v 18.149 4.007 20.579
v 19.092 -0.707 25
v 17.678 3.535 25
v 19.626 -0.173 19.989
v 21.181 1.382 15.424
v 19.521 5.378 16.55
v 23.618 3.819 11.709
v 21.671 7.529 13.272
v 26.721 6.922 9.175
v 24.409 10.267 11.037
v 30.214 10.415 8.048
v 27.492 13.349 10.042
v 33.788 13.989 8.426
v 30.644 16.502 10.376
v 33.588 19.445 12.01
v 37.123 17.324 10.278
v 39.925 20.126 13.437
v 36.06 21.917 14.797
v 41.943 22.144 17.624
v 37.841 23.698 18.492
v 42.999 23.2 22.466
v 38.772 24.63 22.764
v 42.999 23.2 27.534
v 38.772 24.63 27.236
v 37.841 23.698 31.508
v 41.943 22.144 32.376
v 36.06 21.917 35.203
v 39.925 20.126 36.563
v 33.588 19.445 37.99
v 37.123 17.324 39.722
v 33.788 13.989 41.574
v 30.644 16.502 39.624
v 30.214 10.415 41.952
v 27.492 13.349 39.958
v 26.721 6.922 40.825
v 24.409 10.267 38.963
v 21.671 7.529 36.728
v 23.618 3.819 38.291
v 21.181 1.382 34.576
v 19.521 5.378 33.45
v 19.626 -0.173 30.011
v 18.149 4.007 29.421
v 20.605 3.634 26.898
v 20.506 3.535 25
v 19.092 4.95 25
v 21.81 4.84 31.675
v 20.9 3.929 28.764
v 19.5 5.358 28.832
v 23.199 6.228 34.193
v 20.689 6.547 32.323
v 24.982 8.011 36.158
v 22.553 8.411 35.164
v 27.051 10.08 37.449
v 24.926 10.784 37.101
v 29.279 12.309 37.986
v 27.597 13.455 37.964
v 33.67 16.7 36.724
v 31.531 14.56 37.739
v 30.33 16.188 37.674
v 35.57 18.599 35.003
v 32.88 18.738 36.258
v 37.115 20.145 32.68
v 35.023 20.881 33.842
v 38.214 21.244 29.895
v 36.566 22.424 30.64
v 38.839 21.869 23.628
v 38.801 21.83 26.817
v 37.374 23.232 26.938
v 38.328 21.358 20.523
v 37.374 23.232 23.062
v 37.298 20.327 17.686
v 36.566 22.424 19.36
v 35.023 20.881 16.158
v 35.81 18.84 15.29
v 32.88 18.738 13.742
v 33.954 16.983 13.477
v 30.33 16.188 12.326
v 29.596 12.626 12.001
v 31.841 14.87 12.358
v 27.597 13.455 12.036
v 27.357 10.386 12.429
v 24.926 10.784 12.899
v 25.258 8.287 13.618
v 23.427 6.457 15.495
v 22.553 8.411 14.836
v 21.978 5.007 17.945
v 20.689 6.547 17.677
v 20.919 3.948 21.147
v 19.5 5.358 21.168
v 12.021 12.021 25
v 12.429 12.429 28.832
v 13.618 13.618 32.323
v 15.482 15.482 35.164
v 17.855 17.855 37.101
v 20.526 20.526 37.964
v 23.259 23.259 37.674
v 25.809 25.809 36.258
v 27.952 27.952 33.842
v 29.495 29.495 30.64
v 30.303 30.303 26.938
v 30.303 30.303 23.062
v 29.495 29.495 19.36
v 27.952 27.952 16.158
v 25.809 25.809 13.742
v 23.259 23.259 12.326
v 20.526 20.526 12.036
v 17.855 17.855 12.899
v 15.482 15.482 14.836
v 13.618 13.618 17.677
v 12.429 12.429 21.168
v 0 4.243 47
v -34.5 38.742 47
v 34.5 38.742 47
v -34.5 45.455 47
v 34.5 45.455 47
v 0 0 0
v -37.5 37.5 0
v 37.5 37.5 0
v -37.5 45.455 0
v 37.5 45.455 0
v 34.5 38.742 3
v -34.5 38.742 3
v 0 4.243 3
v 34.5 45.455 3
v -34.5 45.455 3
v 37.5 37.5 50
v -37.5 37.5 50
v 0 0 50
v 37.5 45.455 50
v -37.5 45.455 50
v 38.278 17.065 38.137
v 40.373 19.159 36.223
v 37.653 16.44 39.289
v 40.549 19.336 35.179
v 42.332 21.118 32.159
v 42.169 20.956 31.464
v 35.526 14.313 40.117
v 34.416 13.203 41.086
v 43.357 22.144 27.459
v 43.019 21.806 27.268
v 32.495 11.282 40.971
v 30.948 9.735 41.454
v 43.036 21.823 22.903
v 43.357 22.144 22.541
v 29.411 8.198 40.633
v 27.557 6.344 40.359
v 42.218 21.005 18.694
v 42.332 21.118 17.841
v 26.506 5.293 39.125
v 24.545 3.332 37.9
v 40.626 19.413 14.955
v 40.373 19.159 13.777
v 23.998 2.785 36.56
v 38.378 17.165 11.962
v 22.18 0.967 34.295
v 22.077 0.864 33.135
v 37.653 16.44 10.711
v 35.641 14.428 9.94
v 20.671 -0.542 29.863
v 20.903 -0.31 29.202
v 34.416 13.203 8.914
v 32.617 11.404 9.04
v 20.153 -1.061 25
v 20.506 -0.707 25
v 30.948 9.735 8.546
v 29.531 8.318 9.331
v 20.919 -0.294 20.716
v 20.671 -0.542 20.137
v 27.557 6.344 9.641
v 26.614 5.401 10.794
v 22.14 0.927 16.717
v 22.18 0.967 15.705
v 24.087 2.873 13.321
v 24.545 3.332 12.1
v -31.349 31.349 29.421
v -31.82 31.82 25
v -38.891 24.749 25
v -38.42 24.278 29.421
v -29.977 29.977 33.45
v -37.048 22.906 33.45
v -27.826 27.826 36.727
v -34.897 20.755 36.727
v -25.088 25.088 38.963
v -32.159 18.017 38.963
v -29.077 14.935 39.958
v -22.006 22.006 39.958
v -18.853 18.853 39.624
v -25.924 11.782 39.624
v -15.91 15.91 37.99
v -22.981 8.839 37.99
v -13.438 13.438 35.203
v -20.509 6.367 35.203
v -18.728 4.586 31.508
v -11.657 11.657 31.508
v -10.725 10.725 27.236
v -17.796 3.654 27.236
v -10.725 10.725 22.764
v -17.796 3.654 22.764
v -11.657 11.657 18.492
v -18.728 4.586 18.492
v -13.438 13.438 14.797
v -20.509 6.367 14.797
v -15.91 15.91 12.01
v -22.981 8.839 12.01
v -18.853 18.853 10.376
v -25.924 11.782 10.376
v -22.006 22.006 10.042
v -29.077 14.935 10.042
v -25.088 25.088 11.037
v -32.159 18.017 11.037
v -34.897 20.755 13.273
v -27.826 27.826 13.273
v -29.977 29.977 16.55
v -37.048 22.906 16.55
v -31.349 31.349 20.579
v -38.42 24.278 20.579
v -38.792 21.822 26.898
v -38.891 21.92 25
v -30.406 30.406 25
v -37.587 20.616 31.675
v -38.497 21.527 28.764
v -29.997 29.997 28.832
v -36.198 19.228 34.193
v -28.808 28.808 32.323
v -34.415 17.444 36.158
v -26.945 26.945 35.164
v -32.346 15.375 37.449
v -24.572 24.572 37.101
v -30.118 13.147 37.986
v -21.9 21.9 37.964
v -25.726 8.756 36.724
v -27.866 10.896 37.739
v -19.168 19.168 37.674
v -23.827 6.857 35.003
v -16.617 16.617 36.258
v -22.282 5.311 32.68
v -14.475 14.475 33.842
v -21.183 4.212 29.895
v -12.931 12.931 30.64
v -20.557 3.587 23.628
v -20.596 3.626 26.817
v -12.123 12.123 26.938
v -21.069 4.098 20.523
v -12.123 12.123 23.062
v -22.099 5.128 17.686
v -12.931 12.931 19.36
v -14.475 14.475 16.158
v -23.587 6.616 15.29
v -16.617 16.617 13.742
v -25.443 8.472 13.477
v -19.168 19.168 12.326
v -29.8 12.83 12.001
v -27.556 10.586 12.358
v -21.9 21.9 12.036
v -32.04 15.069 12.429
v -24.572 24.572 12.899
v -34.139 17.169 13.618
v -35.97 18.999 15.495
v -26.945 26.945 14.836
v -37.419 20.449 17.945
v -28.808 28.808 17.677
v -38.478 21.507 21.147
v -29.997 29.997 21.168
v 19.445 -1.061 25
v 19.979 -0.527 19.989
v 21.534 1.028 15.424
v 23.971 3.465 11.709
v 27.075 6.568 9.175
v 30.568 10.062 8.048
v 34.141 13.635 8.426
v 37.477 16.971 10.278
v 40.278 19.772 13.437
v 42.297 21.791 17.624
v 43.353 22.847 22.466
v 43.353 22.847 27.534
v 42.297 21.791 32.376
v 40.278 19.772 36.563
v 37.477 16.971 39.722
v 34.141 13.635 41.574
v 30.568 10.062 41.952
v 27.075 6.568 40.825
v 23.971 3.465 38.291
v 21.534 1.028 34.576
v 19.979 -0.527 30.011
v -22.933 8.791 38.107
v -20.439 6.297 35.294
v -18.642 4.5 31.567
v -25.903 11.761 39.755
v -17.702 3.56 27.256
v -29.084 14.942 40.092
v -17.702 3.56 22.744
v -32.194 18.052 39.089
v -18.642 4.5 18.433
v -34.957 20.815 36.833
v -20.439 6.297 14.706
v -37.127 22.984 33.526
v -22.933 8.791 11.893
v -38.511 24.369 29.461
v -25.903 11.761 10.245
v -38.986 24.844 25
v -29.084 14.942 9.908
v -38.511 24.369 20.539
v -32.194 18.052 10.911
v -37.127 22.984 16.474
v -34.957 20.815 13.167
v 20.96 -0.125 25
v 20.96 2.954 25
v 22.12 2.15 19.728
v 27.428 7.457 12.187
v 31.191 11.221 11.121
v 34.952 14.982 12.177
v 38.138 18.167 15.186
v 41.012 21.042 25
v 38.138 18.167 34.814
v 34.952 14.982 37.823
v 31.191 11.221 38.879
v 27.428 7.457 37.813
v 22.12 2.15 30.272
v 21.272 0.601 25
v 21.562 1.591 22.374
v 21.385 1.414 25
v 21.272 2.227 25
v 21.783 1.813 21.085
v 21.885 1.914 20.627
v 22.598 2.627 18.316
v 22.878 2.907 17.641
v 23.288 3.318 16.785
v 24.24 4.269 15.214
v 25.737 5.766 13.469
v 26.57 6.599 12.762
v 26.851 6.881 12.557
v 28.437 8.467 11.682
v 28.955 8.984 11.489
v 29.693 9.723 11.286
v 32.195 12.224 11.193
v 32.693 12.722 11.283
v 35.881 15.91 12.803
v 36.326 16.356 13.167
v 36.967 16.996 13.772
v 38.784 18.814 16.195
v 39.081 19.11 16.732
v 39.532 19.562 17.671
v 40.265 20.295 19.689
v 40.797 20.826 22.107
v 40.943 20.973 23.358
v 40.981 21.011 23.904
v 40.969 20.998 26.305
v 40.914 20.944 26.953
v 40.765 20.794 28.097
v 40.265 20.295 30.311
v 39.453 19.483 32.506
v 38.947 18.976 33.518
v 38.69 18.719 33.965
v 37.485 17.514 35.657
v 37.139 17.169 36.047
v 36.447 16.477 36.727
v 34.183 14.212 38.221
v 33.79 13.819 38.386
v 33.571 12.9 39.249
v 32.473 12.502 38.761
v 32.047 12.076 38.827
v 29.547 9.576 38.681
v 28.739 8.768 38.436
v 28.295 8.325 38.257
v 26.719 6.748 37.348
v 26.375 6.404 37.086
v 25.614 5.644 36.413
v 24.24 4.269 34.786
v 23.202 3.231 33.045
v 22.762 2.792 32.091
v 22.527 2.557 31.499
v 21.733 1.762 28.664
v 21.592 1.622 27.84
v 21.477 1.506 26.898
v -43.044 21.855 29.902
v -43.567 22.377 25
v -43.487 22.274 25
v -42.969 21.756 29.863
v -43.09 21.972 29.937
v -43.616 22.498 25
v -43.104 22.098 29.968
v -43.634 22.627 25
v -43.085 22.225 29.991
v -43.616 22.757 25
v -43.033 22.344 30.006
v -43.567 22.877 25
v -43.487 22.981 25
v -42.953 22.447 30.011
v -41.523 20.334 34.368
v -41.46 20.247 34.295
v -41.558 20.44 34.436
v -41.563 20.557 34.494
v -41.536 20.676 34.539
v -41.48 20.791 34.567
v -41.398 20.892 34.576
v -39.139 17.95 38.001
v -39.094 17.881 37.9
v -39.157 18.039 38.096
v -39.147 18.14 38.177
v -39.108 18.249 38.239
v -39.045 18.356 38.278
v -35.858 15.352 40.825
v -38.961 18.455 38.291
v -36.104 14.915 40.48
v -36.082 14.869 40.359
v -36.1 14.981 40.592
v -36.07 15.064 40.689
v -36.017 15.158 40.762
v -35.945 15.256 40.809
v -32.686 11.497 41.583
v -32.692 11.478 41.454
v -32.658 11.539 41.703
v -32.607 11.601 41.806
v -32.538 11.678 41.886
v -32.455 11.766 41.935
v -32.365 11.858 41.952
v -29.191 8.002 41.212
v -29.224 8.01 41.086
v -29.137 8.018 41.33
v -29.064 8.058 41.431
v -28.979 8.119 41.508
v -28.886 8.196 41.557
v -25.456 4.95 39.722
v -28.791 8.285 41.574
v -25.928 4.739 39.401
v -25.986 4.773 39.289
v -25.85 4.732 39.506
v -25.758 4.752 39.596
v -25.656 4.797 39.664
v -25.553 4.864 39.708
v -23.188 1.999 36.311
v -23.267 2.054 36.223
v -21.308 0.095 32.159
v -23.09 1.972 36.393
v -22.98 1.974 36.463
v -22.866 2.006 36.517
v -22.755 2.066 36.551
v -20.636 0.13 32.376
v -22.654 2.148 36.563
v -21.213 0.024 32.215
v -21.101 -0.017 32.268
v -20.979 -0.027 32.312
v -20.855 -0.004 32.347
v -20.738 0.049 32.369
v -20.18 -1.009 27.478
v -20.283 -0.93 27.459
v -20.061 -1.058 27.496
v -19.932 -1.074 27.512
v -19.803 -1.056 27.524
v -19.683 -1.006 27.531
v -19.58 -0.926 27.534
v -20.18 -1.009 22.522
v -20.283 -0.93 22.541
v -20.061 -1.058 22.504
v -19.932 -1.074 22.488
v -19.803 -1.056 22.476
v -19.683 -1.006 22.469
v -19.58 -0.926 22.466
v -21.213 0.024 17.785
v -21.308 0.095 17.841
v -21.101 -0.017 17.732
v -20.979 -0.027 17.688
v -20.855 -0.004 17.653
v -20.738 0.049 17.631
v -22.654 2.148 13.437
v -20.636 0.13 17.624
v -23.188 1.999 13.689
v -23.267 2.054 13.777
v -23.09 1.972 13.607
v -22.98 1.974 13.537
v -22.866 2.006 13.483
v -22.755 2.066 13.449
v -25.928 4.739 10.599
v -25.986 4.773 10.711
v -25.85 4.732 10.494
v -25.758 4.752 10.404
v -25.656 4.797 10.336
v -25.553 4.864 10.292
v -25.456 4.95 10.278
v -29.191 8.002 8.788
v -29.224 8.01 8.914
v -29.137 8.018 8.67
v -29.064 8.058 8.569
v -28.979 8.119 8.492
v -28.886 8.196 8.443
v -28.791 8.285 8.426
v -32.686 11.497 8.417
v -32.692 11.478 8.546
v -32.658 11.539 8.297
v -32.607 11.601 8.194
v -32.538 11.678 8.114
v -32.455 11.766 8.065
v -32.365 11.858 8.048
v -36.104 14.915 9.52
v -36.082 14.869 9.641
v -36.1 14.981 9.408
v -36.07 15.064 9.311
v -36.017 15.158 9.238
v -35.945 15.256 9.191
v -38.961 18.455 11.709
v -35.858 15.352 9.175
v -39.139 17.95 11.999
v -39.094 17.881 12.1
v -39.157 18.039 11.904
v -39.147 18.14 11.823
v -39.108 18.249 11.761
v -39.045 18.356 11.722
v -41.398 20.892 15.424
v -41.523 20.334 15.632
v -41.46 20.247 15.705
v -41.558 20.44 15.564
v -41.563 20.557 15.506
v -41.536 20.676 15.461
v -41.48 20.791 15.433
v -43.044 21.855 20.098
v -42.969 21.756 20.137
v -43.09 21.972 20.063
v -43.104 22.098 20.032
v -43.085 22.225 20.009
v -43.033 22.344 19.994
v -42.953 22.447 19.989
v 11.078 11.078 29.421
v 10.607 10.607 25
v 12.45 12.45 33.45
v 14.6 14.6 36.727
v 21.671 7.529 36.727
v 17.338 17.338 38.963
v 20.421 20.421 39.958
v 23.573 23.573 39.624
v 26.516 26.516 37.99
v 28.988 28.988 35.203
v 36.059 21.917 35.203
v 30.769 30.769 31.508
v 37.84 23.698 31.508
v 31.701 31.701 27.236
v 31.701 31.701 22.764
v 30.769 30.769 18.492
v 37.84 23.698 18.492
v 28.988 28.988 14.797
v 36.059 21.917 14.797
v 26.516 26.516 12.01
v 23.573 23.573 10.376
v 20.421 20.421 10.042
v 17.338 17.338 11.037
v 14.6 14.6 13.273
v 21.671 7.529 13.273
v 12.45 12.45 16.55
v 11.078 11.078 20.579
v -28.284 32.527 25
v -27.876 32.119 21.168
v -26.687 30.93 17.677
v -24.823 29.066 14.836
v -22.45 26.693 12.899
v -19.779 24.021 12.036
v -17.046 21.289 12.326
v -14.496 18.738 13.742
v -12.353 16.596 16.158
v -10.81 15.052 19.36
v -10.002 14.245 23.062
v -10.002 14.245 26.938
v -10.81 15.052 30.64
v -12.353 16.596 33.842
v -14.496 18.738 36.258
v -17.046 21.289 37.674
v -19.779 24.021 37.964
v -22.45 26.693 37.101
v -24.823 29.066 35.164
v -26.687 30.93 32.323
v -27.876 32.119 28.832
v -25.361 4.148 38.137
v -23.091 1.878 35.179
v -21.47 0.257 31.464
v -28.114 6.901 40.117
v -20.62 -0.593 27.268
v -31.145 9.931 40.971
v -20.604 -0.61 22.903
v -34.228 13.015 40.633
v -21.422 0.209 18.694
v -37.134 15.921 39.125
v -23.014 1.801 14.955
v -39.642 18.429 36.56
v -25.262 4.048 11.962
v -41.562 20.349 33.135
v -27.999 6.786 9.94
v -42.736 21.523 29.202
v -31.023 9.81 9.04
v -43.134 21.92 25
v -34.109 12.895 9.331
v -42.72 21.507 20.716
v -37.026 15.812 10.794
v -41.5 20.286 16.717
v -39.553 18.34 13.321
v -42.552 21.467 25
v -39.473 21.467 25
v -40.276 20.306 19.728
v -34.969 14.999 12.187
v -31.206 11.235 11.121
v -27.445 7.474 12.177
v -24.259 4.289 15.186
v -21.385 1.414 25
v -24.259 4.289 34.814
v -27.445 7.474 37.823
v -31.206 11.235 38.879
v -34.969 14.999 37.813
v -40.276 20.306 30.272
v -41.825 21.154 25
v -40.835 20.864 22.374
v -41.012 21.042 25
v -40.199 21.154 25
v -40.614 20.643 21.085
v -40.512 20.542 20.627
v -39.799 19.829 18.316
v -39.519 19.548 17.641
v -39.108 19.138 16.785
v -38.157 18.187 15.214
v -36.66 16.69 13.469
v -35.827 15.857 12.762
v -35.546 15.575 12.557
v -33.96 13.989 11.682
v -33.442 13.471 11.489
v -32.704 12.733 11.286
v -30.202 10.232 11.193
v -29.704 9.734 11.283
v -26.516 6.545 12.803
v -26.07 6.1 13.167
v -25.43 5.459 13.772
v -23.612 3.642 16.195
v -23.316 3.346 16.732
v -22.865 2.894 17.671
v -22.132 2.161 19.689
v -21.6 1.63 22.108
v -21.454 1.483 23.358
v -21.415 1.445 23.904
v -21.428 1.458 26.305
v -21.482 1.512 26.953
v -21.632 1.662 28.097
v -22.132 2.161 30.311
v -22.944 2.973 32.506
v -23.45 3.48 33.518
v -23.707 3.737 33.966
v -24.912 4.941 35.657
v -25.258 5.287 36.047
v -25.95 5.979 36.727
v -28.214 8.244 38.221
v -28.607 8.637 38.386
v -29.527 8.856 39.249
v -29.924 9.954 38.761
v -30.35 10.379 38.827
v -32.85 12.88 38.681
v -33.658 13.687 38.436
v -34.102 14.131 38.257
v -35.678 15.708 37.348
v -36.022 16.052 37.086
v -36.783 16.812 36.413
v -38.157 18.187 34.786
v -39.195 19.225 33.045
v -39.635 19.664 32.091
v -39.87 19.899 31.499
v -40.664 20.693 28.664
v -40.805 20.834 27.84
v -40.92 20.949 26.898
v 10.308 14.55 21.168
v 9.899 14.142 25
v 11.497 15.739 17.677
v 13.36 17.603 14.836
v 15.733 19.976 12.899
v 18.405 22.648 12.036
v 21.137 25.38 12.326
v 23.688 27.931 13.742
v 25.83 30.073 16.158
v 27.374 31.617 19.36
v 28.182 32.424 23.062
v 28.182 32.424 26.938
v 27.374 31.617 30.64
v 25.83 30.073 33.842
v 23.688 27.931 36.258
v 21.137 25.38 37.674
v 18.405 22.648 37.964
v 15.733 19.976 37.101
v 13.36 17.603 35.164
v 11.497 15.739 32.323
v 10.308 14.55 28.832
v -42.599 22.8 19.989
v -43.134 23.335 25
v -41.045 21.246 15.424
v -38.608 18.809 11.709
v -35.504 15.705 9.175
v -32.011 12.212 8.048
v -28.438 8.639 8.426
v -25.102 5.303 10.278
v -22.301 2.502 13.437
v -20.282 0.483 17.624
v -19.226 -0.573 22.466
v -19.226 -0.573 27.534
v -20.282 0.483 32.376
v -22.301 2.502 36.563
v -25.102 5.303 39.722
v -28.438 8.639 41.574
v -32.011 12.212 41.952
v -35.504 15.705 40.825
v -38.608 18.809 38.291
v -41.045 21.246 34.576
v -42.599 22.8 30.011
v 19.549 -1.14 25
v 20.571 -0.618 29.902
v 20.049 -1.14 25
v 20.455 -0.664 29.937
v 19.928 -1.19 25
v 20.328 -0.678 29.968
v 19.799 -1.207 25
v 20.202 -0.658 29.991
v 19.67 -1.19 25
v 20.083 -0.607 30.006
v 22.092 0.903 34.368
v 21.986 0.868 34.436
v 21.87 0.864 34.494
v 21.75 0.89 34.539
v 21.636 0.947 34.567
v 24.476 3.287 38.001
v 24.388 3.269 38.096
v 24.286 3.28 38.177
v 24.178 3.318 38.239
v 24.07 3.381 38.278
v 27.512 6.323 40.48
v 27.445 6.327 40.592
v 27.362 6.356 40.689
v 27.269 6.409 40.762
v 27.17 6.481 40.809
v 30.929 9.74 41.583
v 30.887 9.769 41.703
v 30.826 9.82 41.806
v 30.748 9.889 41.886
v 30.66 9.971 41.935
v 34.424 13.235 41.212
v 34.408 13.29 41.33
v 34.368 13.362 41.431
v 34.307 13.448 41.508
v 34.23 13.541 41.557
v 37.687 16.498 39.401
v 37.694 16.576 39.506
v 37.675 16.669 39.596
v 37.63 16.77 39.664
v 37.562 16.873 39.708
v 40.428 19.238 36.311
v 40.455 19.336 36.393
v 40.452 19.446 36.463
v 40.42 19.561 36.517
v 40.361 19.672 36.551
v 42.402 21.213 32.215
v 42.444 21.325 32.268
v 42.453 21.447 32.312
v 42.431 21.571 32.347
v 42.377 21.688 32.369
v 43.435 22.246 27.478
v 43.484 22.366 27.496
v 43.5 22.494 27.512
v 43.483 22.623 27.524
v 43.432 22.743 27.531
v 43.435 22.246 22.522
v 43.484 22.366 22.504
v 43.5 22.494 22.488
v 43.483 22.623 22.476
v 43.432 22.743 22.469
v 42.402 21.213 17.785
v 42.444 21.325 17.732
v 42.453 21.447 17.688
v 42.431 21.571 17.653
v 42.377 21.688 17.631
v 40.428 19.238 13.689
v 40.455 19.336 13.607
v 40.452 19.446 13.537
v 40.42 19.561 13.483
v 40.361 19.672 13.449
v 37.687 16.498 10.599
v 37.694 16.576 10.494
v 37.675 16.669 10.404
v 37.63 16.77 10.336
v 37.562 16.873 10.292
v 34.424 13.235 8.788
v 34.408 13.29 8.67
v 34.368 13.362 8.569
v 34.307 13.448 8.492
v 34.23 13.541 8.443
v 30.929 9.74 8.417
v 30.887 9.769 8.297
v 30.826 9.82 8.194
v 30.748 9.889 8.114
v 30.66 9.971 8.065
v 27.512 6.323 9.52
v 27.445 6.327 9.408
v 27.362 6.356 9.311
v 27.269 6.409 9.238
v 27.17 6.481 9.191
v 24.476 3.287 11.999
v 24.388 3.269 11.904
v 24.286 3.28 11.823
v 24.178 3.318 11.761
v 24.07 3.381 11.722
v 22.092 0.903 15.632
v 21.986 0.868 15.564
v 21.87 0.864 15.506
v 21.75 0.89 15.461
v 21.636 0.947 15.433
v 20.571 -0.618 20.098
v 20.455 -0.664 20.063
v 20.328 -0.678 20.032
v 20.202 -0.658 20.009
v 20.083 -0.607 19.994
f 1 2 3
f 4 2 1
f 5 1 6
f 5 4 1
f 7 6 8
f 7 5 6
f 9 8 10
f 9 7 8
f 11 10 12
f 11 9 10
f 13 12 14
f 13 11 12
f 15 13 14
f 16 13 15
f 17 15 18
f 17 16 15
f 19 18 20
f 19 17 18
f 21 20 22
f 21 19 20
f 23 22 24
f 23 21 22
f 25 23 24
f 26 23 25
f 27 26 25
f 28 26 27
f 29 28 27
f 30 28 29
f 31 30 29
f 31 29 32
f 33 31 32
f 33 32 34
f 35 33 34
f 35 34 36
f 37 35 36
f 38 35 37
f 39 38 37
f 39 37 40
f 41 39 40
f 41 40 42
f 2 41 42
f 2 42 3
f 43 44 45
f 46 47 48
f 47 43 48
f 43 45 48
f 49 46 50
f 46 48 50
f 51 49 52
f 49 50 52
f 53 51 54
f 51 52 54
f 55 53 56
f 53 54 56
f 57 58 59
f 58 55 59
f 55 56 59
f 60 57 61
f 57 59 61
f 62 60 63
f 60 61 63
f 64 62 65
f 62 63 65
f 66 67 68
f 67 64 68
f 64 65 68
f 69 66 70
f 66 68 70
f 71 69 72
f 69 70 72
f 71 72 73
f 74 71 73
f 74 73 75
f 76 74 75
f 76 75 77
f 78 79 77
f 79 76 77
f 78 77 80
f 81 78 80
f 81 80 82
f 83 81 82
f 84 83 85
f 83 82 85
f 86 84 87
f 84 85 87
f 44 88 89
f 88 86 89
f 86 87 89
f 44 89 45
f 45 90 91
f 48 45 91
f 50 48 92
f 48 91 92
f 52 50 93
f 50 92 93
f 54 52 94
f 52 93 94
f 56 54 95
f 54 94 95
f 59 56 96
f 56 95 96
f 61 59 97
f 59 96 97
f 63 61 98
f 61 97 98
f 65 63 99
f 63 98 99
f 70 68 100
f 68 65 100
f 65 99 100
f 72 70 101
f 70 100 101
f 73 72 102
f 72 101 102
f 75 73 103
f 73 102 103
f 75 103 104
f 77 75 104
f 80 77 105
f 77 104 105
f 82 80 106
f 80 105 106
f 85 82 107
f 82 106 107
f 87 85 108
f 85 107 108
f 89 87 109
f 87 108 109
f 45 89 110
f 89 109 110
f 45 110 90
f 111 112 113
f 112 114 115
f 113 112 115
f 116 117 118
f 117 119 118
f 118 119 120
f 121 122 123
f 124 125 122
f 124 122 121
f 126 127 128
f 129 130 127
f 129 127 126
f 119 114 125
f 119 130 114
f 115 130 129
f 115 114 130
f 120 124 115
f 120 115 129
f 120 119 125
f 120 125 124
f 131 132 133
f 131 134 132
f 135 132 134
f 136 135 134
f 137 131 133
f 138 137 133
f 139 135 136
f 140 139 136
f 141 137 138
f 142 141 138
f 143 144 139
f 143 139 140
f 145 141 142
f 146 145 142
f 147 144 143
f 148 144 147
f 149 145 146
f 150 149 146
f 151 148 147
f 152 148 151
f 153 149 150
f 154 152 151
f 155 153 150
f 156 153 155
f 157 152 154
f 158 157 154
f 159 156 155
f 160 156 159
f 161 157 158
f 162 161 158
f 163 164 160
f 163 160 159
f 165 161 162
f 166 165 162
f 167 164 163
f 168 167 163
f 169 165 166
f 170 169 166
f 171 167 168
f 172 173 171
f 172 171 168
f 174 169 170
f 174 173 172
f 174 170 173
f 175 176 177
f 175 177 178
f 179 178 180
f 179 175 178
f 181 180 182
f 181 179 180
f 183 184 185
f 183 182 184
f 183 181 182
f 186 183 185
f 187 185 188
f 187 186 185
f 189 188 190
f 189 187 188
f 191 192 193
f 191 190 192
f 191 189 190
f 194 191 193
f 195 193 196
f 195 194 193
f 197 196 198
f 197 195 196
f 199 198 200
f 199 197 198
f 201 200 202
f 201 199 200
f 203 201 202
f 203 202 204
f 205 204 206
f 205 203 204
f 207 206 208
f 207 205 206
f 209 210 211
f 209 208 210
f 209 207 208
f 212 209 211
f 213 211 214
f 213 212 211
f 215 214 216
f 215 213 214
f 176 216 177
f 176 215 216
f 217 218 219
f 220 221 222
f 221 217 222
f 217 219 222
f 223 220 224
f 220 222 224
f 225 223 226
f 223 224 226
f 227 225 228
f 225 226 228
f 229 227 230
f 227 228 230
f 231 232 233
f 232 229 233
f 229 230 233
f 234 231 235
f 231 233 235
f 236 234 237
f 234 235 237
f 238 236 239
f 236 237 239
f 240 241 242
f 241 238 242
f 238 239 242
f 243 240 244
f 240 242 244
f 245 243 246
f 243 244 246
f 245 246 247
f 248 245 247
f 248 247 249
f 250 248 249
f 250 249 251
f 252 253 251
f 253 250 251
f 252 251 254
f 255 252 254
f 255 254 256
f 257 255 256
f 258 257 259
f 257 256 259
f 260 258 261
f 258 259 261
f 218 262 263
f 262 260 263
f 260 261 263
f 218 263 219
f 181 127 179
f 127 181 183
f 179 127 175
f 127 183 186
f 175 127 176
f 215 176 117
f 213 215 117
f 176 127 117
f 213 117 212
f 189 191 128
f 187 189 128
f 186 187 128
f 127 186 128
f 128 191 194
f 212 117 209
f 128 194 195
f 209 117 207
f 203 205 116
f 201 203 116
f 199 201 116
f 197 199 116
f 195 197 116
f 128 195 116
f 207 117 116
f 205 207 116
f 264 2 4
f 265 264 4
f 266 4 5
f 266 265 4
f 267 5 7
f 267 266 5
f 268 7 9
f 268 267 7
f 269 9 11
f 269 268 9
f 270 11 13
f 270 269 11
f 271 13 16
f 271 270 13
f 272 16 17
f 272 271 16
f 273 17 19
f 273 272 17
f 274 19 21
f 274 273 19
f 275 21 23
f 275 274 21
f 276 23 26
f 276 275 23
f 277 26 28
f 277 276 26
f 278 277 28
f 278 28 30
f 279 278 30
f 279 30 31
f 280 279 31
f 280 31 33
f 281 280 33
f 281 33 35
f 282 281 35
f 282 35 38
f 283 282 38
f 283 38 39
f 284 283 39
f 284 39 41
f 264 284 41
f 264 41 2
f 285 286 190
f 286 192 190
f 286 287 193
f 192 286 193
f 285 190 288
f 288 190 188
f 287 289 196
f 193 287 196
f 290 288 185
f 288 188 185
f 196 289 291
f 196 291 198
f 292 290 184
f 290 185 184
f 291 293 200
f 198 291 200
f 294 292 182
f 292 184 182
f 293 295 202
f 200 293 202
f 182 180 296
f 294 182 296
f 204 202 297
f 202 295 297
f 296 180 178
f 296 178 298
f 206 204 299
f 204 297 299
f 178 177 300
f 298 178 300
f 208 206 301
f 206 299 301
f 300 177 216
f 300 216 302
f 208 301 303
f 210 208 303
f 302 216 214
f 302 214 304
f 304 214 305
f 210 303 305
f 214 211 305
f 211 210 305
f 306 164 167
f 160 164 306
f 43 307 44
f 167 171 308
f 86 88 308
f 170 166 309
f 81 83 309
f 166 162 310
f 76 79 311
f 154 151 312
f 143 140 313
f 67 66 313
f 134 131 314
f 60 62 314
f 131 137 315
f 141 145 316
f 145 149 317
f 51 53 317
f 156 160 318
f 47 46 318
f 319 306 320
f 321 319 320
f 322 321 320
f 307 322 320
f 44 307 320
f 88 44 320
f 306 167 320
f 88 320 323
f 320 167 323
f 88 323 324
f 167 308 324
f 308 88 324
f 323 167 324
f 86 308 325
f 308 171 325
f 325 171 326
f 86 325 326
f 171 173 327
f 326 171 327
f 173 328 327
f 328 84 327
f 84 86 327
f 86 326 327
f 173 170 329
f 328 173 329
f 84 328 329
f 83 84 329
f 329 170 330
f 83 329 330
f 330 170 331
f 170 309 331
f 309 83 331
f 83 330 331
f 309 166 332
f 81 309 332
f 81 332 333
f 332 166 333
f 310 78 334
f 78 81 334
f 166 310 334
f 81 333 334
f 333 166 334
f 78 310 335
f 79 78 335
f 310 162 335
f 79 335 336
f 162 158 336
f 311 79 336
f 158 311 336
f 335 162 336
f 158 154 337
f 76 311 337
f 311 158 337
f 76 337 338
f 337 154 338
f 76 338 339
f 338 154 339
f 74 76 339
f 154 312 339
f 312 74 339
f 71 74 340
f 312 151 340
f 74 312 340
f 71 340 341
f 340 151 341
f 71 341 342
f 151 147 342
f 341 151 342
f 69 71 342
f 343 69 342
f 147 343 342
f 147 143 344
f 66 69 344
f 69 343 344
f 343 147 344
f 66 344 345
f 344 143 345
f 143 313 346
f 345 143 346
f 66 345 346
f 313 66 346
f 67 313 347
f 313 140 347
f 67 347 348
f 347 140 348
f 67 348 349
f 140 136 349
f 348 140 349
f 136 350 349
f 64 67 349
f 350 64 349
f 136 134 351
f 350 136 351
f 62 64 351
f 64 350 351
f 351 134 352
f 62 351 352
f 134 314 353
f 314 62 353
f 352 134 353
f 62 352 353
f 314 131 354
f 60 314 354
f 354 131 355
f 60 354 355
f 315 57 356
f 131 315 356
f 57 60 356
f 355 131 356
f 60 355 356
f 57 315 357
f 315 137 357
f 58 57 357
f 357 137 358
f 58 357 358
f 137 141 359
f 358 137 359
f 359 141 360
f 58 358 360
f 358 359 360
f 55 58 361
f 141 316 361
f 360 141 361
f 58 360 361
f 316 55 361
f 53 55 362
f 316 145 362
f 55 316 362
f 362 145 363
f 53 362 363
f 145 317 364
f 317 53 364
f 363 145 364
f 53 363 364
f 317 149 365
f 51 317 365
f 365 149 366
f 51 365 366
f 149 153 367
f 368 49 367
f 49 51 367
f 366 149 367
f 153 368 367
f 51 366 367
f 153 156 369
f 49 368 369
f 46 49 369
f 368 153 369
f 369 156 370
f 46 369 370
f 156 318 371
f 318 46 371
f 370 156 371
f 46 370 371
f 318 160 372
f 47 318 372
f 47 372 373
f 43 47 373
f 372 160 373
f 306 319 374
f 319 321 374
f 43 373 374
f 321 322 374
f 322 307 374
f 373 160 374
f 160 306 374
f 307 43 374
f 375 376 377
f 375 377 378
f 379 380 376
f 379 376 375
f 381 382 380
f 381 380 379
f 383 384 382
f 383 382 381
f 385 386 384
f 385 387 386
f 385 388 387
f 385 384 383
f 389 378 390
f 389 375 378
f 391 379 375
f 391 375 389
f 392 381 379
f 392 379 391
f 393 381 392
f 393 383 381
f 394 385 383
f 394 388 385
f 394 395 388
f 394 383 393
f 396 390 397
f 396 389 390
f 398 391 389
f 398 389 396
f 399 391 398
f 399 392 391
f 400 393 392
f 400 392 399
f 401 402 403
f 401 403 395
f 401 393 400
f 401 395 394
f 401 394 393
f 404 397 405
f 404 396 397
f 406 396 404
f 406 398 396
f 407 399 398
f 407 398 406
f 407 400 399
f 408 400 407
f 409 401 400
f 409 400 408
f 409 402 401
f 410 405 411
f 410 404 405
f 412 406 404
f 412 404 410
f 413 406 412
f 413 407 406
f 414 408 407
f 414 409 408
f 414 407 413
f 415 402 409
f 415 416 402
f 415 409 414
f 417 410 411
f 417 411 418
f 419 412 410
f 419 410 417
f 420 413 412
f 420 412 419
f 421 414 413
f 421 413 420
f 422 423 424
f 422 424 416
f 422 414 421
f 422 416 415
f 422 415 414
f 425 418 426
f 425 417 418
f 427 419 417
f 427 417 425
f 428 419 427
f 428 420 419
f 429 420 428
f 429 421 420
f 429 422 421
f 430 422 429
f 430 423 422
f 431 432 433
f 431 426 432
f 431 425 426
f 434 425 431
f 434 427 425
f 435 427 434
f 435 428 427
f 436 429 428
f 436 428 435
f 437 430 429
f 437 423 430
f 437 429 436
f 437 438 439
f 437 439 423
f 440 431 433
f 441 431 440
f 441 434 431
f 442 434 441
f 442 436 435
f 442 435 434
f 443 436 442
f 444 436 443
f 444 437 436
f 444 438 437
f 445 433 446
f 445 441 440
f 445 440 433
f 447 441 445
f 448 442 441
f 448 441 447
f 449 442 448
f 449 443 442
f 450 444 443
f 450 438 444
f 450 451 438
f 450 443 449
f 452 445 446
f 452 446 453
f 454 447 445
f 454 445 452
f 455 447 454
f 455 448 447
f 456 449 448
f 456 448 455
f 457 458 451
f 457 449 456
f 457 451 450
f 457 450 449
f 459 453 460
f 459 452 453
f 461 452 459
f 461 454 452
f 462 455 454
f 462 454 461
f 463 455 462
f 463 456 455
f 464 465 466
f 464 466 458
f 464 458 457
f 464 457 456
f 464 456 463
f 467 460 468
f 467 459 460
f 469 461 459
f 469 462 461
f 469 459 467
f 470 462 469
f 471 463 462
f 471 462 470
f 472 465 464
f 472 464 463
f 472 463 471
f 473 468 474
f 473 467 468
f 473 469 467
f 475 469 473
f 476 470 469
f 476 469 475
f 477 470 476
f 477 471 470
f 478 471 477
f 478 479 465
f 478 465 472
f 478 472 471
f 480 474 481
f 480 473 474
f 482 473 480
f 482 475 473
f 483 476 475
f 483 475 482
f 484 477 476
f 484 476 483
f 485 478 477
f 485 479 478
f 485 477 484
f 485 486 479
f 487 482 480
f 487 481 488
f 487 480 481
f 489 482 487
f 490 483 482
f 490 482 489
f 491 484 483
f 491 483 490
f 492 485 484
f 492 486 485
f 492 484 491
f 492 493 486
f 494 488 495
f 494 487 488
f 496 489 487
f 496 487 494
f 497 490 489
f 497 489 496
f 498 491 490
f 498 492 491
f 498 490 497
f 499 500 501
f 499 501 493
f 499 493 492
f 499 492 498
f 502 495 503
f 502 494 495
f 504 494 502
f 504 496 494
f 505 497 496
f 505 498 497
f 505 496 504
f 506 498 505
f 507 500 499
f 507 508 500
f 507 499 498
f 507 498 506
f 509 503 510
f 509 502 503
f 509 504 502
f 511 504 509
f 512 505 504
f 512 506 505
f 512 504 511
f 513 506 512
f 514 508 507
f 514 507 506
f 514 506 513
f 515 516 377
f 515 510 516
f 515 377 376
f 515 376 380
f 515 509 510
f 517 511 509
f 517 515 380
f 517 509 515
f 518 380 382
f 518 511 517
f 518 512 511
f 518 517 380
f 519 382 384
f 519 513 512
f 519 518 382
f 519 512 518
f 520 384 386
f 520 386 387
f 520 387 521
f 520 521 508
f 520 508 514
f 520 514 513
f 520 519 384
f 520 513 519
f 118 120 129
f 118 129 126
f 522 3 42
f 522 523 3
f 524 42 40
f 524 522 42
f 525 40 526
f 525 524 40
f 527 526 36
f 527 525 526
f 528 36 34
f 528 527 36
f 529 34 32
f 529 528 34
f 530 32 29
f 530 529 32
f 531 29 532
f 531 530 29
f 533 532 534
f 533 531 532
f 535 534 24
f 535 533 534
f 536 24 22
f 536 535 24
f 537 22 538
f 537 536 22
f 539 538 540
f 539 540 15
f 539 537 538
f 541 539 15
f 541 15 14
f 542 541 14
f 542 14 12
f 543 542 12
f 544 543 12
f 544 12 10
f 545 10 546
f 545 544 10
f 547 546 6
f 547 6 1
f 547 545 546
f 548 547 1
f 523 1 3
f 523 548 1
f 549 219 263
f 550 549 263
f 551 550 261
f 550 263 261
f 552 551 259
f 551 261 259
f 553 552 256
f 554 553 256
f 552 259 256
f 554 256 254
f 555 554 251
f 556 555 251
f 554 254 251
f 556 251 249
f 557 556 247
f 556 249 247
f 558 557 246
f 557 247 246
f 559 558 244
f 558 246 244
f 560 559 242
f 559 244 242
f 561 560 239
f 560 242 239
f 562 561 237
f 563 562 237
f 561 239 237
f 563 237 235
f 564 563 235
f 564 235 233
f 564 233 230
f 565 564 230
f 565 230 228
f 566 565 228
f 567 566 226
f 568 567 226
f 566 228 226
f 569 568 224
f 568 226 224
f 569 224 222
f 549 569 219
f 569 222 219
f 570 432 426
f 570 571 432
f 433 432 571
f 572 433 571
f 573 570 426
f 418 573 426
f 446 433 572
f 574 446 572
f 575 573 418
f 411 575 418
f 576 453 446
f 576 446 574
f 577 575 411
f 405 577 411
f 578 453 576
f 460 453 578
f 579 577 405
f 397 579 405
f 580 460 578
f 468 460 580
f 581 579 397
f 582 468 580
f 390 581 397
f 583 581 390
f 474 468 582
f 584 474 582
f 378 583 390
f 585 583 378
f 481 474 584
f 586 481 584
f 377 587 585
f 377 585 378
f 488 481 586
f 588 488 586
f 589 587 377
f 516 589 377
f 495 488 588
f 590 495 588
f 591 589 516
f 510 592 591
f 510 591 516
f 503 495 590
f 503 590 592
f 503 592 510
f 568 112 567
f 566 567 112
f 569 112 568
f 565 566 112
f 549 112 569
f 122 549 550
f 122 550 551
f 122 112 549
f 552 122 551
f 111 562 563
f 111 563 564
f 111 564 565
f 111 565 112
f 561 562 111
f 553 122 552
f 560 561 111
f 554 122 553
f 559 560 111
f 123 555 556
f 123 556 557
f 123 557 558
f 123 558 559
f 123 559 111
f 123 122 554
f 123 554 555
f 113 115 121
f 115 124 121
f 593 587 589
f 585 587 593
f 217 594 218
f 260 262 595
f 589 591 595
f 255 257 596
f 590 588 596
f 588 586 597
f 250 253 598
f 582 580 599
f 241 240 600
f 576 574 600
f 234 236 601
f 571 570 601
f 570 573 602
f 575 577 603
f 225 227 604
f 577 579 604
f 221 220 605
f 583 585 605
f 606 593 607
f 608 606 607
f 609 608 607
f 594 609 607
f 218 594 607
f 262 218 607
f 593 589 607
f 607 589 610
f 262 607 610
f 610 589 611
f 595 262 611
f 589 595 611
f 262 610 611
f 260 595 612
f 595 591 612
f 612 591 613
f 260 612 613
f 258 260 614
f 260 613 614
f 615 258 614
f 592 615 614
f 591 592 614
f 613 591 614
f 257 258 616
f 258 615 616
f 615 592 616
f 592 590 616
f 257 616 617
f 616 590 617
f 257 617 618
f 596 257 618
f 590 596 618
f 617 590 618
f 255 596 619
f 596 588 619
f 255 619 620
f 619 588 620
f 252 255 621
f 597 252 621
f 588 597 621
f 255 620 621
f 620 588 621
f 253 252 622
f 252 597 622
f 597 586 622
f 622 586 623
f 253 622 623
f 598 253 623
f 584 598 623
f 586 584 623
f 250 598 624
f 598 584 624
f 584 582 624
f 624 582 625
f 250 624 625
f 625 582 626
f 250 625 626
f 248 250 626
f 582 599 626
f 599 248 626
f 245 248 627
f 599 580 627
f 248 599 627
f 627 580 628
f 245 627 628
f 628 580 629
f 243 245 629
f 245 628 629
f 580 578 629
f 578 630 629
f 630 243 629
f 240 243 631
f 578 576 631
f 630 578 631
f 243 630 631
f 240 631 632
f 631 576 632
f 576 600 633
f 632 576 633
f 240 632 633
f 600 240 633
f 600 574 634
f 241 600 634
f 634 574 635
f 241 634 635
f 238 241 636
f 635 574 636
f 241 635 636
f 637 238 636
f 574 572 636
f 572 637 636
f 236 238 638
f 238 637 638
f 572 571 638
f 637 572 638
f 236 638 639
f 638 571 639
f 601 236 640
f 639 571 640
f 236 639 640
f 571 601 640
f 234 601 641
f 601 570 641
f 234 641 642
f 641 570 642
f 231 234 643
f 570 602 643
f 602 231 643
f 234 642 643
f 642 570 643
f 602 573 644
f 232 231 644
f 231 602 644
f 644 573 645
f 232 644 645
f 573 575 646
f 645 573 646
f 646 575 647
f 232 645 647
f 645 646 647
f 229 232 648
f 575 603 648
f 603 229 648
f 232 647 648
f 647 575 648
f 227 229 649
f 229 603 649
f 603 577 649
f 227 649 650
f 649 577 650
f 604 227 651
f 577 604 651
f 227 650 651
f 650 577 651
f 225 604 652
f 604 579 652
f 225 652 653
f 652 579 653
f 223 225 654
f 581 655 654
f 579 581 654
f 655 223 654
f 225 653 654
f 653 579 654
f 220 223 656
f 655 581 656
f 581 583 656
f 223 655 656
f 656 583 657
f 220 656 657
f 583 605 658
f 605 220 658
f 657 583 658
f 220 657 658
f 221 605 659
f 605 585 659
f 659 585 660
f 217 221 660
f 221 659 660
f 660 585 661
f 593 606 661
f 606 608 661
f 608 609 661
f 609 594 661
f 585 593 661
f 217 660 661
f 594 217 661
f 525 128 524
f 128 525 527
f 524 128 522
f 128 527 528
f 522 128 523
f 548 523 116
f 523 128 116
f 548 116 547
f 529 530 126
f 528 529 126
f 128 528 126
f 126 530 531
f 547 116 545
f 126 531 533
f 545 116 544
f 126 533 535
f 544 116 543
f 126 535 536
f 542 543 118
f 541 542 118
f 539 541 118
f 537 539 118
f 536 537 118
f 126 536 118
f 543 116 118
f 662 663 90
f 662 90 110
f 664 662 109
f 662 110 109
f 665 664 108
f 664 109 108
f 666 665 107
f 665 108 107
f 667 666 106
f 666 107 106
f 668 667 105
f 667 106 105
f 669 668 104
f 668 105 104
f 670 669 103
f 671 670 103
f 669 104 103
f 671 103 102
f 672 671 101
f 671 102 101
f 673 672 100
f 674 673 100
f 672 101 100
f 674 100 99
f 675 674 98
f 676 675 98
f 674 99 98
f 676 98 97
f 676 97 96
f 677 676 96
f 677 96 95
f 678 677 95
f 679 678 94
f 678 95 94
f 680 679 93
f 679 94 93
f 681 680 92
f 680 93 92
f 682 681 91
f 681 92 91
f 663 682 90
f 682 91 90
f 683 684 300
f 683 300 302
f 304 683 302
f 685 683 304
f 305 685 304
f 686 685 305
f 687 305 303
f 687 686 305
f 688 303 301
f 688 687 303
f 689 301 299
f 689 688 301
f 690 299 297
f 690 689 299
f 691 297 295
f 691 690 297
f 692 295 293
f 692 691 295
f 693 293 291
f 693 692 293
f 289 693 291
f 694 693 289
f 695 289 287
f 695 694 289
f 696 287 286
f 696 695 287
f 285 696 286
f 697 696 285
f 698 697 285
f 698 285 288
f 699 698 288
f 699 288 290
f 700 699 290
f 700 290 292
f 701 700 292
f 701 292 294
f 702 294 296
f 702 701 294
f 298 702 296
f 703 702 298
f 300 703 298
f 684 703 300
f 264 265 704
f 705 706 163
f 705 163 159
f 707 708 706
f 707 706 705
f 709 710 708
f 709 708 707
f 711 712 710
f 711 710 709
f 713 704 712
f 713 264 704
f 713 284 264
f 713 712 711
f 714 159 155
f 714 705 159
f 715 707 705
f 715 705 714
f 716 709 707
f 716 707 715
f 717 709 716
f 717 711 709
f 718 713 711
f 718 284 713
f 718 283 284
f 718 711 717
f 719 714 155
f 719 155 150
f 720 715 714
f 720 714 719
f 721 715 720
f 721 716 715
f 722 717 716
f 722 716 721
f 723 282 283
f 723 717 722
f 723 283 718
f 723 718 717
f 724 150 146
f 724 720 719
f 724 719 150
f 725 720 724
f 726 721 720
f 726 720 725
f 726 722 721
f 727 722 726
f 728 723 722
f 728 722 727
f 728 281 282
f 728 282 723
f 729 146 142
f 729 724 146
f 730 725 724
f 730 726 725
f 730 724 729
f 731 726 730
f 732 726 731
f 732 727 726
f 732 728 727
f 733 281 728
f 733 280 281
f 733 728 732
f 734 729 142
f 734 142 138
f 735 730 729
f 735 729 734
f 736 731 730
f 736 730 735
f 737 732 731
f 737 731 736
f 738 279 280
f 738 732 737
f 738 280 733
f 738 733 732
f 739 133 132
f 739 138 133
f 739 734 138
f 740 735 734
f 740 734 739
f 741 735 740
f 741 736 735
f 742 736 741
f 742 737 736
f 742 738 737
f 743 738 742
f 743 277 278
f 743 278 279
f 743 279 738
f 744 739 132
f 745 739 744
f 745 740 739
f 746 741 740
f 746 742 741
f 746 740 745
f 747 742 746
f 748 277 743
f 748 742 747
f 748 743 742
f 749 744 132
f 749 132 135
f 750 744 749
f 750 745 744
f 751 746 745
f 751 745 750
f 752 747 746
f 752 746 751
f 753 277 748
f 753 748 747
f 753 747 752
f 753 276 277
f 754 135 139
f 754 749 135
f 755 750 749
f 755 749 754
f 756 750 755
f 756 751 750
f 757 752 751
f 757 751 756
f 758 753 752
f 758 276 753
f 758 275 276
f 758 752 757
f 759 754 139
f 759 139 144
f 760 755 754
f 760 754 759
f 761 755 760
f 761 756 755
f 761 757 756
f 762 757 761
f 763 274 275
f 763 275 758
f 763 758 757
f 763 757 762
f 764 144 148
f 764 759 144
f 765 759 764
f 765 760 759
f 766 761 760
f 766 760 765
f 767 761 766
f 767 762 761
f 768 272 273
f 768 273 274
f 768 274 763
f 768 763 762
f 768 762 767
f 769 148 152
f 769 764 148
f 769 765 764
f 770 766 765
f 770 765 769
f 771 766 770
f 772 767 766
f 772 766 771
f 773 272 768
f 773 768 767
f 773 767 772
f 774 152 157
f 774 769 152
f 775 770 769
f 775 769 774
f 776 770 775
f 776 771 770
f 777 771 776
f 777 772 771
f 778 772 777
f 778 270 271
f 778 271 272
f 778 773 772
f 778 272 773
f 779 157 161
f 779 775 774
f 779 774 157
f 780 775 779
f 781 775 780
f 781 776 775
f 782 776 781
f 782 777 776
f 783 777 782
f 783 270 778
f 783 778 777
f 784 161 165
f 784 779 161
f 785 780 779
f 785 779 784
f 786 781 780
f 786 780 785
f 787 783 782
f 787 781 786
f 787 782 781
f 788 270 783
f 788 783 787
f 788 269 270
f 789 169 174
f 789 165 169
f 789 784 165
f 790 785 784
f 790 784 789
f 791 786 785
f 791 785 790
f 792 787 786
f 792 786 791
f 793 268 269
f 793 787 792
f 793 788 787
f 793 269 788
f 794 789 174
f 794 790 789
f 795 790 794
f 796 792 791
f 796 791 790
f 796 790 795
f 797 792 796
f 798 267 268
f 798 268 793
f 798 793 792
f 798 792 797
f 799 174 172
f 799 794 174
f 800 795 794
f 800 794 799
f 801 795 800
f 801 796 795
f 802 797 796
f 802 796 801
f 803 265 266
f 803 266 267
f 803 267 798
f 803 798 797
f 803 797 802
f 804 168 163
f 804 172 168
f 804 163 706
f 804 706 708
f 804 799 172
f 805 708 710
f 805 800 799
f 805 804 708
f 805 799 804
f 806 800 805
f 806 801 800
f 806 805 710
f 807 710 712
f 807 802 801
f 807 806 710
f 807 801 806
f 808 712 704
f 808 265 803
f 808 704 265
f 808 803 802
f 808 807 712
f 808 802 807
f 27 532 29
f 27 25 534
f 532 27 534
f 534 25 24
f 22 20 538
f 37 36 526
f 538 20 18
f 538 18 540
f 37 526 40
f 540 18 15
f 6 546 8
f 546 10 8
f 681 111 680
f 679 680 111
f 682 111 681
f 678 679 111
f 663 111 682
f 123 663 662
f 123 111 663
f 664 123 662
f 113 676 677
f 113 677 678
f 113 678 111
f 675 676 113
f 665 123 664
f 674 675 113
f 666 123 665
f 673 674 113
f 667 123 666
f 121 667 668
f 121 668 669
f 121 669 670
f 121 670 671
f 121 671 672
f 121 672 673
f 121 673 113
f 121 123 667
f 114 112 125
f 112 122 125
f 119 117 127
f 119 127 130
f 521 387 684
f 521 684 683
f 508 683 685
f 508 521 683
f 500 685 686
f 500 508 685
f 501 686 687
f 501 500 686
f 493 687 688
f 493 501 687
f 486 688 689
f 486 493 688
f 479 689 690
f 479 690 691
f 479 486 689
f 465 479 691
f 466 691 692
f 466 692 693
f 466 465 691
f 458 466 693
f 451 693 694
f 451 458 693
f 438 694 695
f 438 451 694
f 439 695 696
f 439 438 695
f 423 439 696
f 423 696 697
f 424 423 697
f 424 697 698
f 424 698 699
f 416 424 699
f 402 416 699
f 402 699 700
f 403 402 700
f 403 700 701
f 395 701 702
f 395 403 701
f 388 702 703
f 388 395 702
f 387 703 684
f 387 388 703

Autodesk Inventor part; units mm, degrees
ref_plane "YZ Plane" through (0, 0, 0) normal (1, 0, 0) x (0, 1, 0)
ref_plane "XZ Plane" through (0, 0, 0) normal (0, 1, 0) x (-1, 0, 0)
ref_plane "XY Plane" through (0, 0, 0) normal (0, 0, 1) x (1, 0, 0)
sketch "Sketch1" plane through (0, 0, 0) normal (0, 0, 1) x (1, 0, 0)
  line L0 (0, 0) -> (37.4998, 37.4998)
  line L1 (0, 0) -> (60.1041, 0) construction
  line L2 (-37.4998, 37.4998) -> (0, 0)
  line L3 (-37.5, 45.4552) -> (37.5, 45.4552)
  line L4 (37.5, 45.4552) -> (37.5, 37.4998)
  line L5 (-37.5, 37.4998) -> (-37.5, 45.4552)
  line L6 (0, 40.2877) -> (0, 0)
  line L7 (37.5, 37.4998) -> (37.4998, 37.4998)
  line L8 (-37.4998, 37.4998) -> (-37.5, 37.4998)
  line L9 (-25.0019, 42.5142) -> (24.9981, 42.5142) construction
  line L10 (24.9981, 42.5142) -> (24.9981, 37.5142) construction
  dimension "d0" = 45
  dimension "d39" = 75
  dimension "d41" = 50
  dimension "d42" = 5
extrude "Extrusion1" add sketch "Sketch1" along normal blind 50
shell "Shell2" thickness 3 removed faces 1 at (12.5, 45.4552, 16.6667)
sketch "Sketch2" plane through (37.4998, 37.4998, 50) normal (0.7071068, -0.7071068, 0) x (-0.7071068, -0.7071068, 0)
  circle A0 centre (23.0328, 25) radius 13
  line L0 (53.0328, 0) -> (0, 0) projected
  line L1 (53.0328, 50) -> (53.0328, 0) projected
  circle A1 centre (23.0328, 25) radius 15
  dimension "d5" = 26
  dimension "d6" = 25
  dimension "d7" = 30
  dimension "d26" = 30
sketch "Sketch3" plane through (0, 0, 50) normal (-0.7071068, -0.7071068, 0) x (-0.7071068, 0.7071068, 0)
  circle A0 centre (30, 25) radius 13
  line L0 (0, 50) -> (0, 0) projected
  line L1 (53.0328, 0) -> (0, 0) projected
  circle A1 centre (30, 25) radius 15
  dimension "d8" = 26
  dimension "d9" = 30
  dimension "d10" = 25
  dimension "d29" = 30
extrude "Extrusion2" cut sketch "Sketch3" against normal through all contours A0
extrude "Extrusion3" cut sketch "Sketch2" against normal blind 10 contours A0
extrude "Extrusion6" add sketch "Sketch2" along normal blind 15
extrude "Extrusion7" add sketch "Sketch3" along normal blind 15
sketch "Sketch9" plane through (-31.8198, 10.6066, 25) normal (-0.7071068, -0.7071068, 0) x (-0.7071068, 0.7071068, 0)
  circle A0 centre (0, 0) radius 15
  circle A1 centre (0, 0) radius 17
  point P0 (-30, 25)
  dimension "d81" = 34
extrude "Extrusion12" add sketch "Sketch9" against normal blind 5
chamfer "Chamfer2" distance 4 angle 25 1 edges at (-16.2635, 2.1213, 25) measured on face at (-41.4446, 24.9455, 26.3679)
fillet "Fillet3" radius 3 1 edges at (-22.6274, 1.4142, 25)
fillet "Fillet4" radius 0.5 1 edges at (-19.799, -1.4142, 25)
sketch "Sketch16" plane through (31.8198, 10.6066, 25) normal (0.7071068, -0.7071068, 0) x (-0.7071068, -0.7071068, 0)
  circle A0 centre (0, 0) radius 17
  circle A1 centre (0, 0) radius 13 projected
  point P0 (30, 25)
  dimension "d134" = 34
extrude "Extrusion19" add sketch "Sketch16" against normal blind 5
chamfer "Chamfer3" distance 2 distance2 4 1 edges at (40.3051, 26.163, 25) measured on face at (16.954, 2.8119, 27.5527)
fillet "Fillet7" radius 3 1 edges at (41.0122, 19.799, 25)
fillet "Fillet8" radius 0.5 1 edges at (43.8406, 22.6274, 25)
properties part number "Chamber3-part1"
